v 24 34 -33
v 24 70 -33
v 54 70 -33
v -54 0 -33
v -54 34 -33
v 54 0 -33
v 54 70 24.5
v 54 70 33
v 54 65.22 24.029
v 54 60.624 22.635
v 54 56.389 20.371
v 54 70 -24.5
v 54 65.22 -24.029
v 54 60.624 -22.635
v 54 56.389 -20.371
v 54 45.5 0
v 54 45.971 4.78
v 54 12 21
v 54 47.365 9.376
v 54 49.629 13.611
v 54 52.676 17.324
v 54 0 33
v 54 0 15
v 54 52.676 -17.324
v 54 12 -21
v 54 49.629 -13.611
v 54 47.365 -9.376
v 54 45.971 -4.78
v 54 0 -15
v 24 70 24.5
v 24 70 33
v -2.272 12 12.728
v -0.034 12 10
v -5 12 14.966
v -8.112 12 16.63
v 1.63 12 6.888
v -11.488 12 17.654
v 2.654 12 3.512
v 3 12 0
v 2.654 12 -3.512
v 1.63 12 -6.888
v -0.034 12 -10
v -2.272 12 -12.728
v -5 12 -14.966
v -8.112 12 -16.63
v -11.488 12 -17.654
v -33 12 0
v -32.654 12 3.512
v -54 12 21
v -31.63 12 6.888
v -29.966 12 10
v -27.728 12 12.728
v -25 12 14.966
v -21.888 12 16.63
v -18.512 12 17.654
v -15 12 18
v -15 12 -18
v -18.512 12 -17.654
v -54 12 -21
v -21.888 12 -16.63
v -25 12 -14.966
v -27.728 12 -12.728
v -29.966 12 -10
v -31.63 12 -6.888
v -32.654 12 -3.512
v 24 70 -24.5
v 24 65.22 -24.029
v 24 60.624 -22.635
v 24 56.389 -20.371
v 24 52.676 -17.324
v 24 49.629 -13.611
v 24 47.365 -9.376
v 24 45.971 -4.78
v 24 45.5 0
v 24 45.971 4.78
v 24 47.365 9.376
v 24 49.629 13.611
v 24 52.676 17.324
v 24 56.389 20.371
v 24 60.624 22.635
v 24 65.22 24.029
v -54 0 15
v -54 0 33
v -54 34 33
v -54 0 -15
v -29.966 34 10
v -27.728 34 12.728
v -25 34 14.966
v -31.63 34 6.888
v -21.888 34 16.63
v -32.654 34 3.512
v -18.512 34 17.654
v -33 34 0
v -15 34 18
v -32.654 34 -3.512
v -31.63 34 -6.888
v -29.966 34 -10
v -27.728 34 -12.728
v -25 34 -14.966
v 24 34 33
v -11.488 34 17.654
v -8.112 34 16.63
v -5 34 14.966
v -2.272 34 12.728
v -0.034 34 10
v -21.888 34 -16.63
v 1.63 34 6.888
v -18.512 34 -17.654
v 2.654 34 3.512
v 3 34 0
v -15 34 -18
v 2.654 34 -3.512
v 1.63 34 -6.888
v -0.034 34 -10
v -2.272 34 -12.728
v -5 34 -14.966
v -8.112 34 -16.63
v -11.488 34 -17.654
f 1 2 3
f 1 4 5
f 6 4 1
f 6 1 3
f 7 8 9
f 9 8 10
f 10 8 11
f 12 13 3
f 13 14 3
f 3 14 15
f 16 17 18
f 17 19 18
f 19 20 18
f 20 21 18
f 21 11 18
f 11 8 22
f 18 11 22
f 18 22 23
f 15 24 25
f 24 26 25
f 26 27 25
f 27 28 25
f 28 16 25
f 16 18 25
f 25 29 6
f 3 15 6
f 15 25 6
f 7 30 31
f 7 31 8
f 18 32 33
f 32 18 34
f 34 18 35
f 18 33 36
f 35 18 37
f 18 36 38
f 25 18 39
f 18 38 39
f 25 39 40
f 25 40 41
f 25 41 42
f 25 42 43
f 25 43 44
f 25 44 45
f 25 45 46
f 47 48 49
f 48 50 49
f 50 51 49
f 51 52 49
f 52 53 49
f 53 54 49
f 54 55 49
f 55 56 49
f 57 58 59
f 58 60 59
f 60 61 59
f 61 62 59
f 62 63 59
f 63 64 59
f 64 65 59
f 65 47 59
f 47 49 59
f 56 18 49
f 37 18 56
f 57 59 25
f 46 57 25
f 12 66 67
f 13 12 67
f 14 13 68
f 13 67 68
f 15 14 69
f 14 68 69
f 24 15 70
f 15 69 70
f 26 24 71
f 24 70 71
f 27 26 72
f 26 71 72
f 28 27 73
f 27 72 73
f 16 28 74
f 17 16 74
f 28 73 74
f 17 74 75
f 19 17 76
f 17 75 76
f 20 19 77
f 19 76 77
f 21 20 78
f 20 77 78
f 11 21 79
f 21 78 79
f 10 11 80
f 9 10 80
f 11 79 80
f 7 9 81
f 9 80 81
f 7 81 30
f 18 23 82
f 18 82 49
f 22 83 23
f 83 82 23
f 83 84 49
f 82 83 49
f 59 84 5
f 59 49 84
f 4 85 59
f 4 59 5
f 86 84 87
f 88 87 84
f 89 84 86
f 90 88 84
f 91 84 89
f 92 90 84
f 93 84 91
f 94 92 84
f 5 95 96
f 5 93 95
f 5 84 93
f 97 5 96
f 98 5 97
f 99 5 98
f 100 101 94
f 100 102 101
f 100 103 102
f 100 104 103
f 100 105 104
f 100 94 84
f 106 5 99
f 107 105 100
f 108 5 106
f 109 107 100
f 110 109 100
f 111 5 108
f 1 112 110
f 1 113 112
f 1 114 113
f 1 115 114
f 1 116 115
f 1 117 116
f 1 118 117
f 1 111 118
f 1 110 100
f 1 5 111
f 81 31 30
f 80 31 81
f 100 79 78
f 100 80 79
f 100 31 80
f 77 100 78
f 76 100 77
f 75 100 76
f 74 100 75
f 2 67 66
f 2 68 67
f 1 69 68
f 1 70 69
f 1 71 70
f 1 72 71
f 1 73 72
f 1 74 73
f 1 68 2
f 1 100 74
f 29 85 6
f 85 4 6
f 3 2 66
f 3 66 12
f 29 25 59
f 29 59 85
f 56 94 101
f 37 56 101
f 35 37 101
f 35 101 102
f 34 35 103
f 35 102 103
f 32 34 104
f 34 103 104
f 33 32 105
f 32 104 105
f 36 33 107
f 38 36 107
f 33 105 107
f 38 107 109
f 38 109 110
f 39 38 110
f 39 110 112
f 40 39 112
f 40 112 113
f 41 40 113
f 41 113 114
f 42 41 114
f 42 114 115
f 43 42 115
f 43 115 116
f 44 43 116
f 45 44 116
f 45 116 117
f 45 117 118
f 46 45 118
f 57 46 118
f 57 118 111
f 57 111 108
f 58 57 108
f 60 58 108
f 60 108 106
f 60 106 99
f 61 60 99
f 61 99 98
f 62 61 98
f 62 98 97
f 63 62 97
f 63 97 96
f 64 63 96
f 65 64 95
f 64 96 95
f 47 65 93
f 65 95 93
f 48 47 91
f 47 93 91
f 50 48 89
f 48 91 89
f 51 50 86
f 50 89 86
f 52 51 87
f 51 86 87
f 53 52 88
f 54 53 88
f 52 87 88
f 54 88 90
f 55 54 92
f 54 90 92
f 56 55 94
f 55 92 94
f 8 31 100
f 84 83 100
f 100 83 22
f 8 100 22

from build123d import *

# Parameters (mm, degrees)
SKETCH_1_W          = 78
SKETCH_1_H          = 66
EXTRUDE_1_DEPTH     = 34
SKETCH_1_3_W        = 30
SKETCH_1_3_H        = 66
EXTRUDE_2_DEPTH     = 70
SKETCH_2_R          = 18
CUT_EXTRUDE_1_DEPTH = 23
SKETCH_3_R          = 24.5
CUT_EXTRUDE_2_DEPTH = 70
CUT_EXTRUDE_3_REACH = 134.865


with BuildPart() as part:
    # 草图1 → 凸台-拉伸1 (new body)
    with BuildSketch(Plane(origin=(0, 0, 0), x_dir=(1, 0, 0), z_dir=(0, 1, 0))):
        with Locations((-15, 0)):
            Rectangle(SKETCH_1_W, SKETCH_1_H)
    extrude(amount=EXTRUDE_1_DEPTH)

    # 草图1<3> → 凸台-拉伸2 (add)
    with BuildSketch(Plane(origin=(0, 0, 0), x_dir=(1, 0, 0), z_dir=(0, 1, 0))):
        with Locations((39, 0)):
            Rectangle(SKETCH_1_3_W, SKETCH_1_3_H)
    extrude(amount=EXTRUDE_2_DEPTH)

    # 草图2 → 切除-拉伸1 (cut)
    with BuildSketch(Plane(origin=(0, 34, 0), x_dir=(1, 0, 0), z_dir=(0, 1, 0))):
        with Locations((-15, 0)):
            Circle(SKETCH_2_R)
    extrude(amount=-CUT_EXTRUDE_1_DEPTH, mode=Mode.SUBTRACT)

    # 草图3 → 切除-拉伸2 (cut)
    with BuildSketch(Plane.ZY.offset(-24)):
        with Locations((0, 70)):
            Circle(SKETCH_3_R)
    extrude(amount=-CUT_EXTRUDE_2_DEPTH, mode=Mode.SUBTRACT)

    # 草图4 → 切除-拉伸3 (cut, up to next)
    with BuildSketch(Plane.ZY.offset(54), mode=Mode.PRIVATE) as cut_extrude_3_sk1:
        Polygon((21, 12), (-21, 12), (-15, 0), (15, 0), align=None)
    cut_extrude_3_tool1 = extrude(cut_extrude_3_sk1.sketch, amount=-CUT_EXTRUDE_3_REACH, mode=Mode.PRIVATE) & part.part
    add(cut_extrude_3_tool1.solids().sort_by_distance((-54, 6.333333, 0))[0], mode=Mode.SUBTRACT)


solid = part.part
